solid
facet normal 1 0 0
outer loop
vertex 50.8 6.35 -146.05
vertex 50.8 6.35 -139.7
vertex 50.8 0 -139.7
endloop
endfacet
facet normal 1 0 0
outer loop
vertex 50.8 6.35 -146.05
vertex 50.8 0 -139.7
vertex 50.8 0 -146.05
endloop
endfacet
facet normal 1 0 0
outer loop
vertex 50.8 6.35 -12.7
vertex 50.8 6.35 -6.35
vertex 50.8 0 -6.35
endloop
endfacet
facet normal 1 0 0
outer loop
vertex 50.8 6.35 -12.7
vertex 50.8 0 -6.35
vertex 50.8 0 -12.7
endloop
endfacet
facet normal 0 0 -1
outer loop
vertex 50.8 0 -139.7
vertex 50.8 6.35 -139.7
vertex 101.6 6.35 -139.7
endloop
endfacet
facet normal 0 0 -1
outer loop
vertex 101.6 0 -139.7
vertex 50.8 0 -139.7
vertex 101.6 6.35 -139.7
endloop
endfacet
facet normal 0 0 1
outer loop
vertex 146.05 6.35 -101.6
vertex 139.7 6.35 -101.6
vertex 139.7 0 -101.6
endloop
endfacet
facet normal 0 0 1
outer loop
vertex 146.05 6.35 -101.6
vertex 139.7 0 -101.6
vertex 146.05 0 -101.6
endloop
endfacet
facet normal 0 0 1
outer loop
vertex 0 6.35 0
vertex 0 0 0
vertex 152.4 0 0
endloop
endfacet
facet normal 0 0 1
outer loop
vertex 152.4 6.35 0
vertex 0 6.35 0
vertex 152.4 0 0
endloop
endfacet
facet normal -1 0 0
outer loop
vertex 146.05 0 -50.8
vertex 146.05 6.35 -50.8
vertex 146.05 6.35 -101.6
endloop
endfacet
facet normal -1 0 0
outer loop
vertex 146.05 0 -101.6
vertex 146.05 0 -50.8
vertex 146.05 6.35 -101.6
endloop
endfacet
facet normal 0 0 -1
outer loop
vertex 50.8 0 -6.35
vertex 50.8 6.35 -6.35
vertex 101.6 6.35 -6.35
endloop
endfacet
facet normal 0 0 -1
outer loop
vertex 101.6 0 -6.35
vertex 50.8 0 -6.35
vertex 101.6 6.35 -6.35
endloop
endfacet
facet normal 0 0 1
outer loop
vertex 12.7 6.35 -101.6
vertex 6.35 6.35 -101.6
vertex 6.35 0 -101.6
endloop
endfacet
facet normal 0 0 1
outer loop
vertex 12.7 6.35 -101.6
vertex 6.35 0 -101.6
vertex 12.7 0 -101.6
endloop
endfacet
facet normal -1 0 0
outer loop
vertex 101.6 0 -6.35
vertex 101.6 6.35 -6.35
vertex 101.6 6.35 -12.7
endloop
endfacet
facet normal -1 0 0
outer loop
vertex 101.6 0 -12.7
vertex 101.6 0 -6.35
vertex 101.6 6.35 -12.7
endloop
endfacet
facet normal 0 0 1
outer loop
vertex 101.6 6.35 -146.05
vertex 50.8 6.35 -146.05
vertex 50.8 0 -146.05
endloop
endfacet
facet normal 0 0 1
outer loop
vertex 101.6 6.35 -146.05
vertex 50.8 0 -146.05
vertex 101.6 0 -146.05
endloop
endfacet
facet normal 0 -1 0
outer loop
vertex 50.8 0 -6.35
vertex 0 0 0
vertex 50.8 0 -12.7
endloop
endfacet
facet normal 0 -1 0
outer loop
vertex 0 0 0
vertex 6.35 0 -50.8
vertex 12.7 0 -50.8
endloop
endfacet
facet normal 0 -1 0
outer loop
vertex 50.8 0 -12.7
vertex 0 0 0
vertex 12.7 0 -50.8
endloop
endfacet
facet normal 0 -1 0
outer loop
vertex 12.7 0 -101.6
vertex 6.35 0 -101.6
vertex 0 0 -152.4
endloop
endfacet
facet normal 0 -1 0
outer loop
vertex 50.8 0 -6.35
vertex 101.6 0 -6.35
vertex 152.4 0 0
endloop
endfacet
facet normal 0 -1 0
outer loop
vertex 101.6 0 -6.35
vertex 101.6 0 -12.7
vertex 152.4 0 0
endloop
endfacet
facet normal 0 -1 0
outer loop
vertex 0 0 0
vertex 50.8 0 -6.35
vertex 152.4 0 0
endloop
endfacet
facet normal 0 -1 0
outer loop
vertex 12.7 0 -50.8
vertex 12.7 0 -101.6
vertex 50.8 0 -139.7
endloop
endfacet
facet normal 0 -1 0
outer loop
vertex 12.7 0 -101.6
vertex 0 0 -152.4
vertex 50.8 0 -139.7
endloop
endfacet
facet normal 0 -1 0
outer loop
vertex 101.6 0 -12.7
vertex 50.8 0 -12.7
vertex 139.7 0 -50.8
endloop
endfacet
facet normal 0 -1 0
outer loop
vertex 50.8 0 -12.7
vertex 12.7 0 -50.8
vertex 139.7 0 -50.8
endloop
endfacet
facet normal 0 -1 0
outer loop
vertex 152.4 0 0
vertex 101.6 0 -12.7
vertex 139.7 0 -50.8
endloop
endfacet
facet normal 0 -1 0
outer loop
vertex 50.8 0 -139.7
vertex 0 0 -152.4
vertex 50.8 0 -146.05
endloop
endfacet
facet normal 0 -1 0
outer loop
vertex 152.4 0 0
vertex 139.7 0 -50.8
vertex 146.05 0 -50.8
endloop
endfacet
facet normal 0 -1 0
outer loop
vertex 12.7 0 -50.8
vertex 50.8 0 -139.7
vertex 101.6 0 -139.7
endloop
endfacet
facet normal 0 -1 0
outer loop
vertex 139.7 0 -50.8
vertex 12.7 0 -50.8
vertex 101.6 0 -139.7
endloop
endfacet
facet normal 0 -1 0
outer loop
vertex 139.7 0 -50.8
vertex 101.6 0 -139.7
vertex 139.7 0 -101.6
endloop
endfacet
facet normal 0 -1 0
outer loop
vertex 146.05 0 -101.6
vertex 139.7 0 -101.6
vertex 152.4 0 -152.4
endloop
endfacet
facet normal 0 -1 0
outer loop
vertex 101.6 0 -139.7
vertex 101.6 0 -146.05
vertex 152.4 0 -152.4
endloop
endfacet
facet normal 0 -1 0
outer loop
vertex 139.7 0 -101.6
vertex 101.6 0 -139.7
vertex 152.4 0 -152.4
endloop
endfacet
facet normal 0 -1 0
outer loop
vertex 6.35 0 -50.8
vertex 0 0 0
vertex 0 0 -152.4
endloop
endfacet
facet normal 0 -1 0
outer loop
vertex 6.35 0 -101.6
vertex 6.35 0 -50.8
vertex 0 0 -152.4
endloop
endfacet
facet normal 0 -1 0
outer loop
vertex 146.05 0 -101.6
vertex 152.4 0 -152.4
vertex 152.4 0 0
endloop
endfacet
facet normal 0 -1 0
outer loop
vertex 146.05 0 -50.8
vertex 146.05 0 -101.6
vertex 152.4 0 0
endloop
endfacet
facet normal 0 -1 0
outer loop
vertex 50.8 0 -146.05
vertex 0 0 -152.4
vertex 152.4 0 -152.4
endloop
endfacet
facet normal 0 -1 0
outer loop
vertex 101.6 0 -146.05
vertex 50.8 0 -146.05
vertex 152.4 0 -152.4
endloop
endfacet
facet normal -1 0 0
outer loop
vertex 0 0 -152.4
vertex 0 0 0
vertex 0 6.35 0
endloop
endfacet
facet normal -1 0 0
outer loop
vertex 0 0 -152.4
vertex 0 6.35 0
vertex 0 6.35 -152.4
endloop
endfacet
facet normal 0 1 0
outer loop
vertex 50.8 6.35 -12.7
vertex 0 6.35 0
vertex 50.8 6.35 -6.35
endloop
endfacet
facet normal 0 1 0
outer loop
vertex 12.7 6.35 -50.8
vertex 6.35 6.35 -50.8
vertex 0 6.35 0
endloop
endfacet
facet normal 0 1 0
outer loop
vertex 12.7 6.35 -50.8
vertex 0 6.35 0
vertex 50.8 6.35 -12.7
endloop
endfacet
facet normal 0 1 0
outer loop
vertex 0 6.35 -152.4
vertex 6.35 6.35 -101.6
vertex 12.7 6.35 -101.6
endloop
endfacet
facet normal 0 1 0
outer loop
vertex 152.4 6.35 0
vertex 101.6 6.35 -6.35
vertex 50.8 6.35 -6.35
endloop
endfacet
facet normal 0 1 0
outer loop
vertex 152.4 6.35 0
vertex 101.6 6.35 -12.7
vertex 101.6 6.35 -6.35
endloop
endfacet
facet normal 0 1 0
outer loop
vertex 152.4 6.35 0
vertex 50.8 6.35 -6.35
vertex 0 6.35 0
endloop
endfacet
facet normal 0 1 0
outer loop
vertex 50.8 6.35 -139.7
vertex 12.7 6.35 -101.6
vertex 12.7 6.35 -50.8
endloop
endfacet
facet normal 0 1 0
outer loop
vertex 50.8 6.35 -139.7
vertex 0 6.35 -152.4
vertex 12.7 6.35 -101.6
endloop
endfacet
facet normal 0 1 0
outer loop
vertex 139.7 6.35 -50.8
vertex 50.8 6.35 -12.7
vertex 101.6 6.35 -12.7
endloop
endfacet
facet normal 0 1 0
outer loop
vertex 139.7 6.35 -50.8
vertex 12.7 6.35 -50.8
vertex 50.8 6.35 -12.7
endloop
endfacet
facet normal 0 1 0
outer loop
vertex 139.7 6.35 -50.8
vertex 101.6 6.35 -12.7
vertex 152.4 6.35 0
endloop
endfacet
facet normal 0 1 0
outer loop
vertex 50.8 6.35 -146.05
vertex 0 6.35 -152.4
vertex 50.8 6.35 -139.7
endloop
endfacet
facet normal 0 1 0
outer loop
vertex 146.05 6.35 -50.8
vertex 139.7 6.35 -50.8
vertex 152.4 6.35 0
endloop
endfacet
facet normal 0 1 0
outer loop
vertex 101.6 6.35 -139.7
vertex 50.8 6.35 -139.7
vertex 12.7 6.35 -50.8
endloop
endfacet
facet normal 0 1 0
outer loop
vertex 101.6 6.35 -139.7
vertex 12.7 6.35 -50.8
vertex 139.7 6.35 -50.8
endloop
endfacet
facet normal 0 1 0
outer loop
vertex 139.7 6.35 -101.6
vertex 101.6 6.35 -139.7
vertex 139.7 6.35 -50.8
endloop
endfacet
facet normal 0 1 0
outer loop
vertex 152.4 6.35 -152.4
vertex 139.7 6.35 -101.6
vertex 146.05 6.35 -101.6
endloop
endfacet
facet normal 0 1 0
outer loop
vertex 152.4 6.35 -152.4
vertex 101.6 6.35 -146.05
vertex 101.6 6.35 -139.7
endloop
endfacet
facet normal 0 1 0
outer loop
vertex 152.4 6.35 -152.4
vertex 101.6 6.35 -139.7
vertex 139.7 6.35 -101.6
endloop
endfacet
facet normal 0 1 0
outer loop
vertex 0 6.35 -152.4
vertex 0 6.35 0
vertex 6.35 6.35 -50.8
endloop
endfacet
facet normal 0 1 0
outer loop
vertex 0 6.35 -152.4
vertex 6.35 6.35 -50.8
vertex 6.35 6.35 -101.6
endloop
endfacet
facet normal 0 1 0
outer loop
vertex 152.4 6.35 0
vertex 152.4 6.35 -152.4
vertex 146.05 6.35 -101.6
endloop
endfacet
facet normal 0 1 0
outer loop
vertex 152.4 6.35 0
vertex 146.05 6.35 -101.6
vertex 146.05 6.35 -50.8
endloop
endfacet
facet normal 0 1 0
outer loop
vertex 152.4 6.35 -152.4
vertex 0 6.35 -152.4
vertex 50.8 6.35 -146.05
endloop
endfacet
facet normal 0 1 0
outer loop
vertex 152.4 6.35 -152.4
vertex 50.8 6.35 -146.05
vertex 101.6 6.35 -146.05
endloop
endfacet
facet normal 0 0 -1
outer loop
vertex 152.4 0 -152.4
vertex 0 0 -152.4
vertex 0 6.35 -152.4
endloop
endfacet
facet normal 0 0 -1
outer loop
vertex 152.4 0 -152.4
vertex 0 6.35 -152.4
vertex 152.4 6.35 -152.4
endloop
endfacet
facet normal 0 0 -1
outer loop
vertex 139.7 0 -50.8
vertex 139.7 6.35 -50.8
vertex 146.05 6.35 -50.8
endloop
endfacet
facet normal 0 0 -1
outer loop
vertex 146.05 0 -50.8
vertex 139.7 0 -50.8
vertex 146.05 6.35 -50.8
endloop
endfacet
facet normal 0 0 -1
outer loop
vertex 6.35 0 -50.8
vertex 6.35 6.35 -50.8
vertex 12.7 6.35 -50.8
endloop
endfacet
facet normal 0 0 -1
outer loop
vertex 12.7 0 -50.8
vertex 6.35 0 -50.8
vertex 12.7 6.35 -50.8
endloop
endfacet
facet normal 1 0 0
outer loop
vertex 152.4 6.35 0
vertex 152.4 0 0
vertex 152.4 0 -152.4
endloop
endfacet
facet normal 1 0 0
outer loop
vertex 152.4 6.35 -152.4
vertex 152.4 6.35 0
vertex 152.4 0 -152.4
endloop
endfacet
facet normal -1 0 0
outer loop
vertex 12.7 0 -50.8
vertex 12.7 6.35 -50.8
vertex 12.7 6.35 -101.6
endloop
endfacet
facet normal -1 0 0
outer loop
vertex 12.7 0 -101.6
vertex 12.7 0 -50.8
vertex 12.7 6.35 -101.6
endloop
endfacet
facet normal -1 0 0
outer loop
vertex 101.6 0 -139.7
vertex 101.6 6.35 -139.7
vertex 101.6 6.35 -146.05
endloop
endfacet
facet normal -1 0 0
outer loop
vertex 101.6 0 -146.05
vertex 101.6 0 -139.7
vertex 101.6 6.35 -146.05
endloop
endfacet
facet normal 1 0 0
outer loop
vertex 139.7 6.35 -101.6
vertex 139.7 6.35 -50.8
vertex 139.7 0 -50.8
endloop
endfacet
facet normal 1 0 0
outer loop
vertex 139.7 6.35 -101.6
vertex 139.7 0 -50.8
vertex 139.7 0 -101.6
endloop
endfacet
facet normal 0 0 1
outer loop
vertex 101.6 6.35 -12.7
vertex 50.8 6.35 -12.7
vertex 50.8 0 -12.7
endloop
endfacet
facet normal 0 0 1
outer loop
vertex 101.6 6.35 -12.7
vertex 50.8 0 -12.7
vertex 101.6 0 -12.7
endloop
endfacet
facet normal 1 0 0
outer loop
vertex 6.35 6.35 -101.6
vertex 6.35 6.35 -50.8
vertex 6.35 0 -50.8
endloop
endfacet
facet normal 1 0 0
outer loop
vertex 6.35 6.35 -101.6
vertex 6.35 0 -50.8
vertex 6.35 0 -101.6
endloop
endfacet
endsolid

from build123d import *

# Parameters (mm, degrees)
SKETCH1_W               = 152.4
SKETCH1_H               = 152.4
BOSS_EXTRUDE1_DEPTH     = 6.35
SKETCH2_W               = 6.35
SKETCH2_H               = 50.8
SKETCH2_W_2             = 50.8
SKETCH2_H_2             = 6.35
CUT_EXTRUDE1_DEPTH      = 6.35
CUT_EXTRUDE1_DEPTH_BACK = 16.51


with BuildPart() as part:
    # Sketch1 → Boss-Extrude1 (new body)
    with BuildSketch(Plane(origin=(0, 0, 0), x_dir=(1, 0, 0), z_dir=(0, 1, 0))):
        with Locations((76.2, 76.2)):
            Rectangle(SKETCH1_W, SKETCH1_H)
    extrude(amount=BOSS_EXTRUDE1_DEPTH)

    # Sketch2 → Cut-Extrude1 (cut, two sides)
    with BuildSketch(Plane(origin=(0, 6.35, 0), x_dir=(1, 0, 0), z_dir=(0, 1, 0))) as cut_extrude1_sk:
        with Locations((9.525, 76.2)):
            Rectangle(SKETCH2_W, SKETCH2_H)
        with Locations((142.875, 76.2)):
            Rectangle(SKETCH2_W, SKETCH2_H)
        with Locations((76.2, 9.525)):
            Rectangle(SKETCH2_W_2, SKETCH2_H_2)
        with Locations((76.2, 142.875)):
            Rectangle(SKETCH2_W_2, SKETCH2_H_2)
    extrude(amount=CUT_EXTRUDE1_DEPTH, mode=Mode.SUBTRACT)
    extrude(cut_extrude1_sk.sketch, amount=-CUT_EXTRUDE1_DEPTH_BACK, mode=Mode.SUBTRACT)


solid = part.part
